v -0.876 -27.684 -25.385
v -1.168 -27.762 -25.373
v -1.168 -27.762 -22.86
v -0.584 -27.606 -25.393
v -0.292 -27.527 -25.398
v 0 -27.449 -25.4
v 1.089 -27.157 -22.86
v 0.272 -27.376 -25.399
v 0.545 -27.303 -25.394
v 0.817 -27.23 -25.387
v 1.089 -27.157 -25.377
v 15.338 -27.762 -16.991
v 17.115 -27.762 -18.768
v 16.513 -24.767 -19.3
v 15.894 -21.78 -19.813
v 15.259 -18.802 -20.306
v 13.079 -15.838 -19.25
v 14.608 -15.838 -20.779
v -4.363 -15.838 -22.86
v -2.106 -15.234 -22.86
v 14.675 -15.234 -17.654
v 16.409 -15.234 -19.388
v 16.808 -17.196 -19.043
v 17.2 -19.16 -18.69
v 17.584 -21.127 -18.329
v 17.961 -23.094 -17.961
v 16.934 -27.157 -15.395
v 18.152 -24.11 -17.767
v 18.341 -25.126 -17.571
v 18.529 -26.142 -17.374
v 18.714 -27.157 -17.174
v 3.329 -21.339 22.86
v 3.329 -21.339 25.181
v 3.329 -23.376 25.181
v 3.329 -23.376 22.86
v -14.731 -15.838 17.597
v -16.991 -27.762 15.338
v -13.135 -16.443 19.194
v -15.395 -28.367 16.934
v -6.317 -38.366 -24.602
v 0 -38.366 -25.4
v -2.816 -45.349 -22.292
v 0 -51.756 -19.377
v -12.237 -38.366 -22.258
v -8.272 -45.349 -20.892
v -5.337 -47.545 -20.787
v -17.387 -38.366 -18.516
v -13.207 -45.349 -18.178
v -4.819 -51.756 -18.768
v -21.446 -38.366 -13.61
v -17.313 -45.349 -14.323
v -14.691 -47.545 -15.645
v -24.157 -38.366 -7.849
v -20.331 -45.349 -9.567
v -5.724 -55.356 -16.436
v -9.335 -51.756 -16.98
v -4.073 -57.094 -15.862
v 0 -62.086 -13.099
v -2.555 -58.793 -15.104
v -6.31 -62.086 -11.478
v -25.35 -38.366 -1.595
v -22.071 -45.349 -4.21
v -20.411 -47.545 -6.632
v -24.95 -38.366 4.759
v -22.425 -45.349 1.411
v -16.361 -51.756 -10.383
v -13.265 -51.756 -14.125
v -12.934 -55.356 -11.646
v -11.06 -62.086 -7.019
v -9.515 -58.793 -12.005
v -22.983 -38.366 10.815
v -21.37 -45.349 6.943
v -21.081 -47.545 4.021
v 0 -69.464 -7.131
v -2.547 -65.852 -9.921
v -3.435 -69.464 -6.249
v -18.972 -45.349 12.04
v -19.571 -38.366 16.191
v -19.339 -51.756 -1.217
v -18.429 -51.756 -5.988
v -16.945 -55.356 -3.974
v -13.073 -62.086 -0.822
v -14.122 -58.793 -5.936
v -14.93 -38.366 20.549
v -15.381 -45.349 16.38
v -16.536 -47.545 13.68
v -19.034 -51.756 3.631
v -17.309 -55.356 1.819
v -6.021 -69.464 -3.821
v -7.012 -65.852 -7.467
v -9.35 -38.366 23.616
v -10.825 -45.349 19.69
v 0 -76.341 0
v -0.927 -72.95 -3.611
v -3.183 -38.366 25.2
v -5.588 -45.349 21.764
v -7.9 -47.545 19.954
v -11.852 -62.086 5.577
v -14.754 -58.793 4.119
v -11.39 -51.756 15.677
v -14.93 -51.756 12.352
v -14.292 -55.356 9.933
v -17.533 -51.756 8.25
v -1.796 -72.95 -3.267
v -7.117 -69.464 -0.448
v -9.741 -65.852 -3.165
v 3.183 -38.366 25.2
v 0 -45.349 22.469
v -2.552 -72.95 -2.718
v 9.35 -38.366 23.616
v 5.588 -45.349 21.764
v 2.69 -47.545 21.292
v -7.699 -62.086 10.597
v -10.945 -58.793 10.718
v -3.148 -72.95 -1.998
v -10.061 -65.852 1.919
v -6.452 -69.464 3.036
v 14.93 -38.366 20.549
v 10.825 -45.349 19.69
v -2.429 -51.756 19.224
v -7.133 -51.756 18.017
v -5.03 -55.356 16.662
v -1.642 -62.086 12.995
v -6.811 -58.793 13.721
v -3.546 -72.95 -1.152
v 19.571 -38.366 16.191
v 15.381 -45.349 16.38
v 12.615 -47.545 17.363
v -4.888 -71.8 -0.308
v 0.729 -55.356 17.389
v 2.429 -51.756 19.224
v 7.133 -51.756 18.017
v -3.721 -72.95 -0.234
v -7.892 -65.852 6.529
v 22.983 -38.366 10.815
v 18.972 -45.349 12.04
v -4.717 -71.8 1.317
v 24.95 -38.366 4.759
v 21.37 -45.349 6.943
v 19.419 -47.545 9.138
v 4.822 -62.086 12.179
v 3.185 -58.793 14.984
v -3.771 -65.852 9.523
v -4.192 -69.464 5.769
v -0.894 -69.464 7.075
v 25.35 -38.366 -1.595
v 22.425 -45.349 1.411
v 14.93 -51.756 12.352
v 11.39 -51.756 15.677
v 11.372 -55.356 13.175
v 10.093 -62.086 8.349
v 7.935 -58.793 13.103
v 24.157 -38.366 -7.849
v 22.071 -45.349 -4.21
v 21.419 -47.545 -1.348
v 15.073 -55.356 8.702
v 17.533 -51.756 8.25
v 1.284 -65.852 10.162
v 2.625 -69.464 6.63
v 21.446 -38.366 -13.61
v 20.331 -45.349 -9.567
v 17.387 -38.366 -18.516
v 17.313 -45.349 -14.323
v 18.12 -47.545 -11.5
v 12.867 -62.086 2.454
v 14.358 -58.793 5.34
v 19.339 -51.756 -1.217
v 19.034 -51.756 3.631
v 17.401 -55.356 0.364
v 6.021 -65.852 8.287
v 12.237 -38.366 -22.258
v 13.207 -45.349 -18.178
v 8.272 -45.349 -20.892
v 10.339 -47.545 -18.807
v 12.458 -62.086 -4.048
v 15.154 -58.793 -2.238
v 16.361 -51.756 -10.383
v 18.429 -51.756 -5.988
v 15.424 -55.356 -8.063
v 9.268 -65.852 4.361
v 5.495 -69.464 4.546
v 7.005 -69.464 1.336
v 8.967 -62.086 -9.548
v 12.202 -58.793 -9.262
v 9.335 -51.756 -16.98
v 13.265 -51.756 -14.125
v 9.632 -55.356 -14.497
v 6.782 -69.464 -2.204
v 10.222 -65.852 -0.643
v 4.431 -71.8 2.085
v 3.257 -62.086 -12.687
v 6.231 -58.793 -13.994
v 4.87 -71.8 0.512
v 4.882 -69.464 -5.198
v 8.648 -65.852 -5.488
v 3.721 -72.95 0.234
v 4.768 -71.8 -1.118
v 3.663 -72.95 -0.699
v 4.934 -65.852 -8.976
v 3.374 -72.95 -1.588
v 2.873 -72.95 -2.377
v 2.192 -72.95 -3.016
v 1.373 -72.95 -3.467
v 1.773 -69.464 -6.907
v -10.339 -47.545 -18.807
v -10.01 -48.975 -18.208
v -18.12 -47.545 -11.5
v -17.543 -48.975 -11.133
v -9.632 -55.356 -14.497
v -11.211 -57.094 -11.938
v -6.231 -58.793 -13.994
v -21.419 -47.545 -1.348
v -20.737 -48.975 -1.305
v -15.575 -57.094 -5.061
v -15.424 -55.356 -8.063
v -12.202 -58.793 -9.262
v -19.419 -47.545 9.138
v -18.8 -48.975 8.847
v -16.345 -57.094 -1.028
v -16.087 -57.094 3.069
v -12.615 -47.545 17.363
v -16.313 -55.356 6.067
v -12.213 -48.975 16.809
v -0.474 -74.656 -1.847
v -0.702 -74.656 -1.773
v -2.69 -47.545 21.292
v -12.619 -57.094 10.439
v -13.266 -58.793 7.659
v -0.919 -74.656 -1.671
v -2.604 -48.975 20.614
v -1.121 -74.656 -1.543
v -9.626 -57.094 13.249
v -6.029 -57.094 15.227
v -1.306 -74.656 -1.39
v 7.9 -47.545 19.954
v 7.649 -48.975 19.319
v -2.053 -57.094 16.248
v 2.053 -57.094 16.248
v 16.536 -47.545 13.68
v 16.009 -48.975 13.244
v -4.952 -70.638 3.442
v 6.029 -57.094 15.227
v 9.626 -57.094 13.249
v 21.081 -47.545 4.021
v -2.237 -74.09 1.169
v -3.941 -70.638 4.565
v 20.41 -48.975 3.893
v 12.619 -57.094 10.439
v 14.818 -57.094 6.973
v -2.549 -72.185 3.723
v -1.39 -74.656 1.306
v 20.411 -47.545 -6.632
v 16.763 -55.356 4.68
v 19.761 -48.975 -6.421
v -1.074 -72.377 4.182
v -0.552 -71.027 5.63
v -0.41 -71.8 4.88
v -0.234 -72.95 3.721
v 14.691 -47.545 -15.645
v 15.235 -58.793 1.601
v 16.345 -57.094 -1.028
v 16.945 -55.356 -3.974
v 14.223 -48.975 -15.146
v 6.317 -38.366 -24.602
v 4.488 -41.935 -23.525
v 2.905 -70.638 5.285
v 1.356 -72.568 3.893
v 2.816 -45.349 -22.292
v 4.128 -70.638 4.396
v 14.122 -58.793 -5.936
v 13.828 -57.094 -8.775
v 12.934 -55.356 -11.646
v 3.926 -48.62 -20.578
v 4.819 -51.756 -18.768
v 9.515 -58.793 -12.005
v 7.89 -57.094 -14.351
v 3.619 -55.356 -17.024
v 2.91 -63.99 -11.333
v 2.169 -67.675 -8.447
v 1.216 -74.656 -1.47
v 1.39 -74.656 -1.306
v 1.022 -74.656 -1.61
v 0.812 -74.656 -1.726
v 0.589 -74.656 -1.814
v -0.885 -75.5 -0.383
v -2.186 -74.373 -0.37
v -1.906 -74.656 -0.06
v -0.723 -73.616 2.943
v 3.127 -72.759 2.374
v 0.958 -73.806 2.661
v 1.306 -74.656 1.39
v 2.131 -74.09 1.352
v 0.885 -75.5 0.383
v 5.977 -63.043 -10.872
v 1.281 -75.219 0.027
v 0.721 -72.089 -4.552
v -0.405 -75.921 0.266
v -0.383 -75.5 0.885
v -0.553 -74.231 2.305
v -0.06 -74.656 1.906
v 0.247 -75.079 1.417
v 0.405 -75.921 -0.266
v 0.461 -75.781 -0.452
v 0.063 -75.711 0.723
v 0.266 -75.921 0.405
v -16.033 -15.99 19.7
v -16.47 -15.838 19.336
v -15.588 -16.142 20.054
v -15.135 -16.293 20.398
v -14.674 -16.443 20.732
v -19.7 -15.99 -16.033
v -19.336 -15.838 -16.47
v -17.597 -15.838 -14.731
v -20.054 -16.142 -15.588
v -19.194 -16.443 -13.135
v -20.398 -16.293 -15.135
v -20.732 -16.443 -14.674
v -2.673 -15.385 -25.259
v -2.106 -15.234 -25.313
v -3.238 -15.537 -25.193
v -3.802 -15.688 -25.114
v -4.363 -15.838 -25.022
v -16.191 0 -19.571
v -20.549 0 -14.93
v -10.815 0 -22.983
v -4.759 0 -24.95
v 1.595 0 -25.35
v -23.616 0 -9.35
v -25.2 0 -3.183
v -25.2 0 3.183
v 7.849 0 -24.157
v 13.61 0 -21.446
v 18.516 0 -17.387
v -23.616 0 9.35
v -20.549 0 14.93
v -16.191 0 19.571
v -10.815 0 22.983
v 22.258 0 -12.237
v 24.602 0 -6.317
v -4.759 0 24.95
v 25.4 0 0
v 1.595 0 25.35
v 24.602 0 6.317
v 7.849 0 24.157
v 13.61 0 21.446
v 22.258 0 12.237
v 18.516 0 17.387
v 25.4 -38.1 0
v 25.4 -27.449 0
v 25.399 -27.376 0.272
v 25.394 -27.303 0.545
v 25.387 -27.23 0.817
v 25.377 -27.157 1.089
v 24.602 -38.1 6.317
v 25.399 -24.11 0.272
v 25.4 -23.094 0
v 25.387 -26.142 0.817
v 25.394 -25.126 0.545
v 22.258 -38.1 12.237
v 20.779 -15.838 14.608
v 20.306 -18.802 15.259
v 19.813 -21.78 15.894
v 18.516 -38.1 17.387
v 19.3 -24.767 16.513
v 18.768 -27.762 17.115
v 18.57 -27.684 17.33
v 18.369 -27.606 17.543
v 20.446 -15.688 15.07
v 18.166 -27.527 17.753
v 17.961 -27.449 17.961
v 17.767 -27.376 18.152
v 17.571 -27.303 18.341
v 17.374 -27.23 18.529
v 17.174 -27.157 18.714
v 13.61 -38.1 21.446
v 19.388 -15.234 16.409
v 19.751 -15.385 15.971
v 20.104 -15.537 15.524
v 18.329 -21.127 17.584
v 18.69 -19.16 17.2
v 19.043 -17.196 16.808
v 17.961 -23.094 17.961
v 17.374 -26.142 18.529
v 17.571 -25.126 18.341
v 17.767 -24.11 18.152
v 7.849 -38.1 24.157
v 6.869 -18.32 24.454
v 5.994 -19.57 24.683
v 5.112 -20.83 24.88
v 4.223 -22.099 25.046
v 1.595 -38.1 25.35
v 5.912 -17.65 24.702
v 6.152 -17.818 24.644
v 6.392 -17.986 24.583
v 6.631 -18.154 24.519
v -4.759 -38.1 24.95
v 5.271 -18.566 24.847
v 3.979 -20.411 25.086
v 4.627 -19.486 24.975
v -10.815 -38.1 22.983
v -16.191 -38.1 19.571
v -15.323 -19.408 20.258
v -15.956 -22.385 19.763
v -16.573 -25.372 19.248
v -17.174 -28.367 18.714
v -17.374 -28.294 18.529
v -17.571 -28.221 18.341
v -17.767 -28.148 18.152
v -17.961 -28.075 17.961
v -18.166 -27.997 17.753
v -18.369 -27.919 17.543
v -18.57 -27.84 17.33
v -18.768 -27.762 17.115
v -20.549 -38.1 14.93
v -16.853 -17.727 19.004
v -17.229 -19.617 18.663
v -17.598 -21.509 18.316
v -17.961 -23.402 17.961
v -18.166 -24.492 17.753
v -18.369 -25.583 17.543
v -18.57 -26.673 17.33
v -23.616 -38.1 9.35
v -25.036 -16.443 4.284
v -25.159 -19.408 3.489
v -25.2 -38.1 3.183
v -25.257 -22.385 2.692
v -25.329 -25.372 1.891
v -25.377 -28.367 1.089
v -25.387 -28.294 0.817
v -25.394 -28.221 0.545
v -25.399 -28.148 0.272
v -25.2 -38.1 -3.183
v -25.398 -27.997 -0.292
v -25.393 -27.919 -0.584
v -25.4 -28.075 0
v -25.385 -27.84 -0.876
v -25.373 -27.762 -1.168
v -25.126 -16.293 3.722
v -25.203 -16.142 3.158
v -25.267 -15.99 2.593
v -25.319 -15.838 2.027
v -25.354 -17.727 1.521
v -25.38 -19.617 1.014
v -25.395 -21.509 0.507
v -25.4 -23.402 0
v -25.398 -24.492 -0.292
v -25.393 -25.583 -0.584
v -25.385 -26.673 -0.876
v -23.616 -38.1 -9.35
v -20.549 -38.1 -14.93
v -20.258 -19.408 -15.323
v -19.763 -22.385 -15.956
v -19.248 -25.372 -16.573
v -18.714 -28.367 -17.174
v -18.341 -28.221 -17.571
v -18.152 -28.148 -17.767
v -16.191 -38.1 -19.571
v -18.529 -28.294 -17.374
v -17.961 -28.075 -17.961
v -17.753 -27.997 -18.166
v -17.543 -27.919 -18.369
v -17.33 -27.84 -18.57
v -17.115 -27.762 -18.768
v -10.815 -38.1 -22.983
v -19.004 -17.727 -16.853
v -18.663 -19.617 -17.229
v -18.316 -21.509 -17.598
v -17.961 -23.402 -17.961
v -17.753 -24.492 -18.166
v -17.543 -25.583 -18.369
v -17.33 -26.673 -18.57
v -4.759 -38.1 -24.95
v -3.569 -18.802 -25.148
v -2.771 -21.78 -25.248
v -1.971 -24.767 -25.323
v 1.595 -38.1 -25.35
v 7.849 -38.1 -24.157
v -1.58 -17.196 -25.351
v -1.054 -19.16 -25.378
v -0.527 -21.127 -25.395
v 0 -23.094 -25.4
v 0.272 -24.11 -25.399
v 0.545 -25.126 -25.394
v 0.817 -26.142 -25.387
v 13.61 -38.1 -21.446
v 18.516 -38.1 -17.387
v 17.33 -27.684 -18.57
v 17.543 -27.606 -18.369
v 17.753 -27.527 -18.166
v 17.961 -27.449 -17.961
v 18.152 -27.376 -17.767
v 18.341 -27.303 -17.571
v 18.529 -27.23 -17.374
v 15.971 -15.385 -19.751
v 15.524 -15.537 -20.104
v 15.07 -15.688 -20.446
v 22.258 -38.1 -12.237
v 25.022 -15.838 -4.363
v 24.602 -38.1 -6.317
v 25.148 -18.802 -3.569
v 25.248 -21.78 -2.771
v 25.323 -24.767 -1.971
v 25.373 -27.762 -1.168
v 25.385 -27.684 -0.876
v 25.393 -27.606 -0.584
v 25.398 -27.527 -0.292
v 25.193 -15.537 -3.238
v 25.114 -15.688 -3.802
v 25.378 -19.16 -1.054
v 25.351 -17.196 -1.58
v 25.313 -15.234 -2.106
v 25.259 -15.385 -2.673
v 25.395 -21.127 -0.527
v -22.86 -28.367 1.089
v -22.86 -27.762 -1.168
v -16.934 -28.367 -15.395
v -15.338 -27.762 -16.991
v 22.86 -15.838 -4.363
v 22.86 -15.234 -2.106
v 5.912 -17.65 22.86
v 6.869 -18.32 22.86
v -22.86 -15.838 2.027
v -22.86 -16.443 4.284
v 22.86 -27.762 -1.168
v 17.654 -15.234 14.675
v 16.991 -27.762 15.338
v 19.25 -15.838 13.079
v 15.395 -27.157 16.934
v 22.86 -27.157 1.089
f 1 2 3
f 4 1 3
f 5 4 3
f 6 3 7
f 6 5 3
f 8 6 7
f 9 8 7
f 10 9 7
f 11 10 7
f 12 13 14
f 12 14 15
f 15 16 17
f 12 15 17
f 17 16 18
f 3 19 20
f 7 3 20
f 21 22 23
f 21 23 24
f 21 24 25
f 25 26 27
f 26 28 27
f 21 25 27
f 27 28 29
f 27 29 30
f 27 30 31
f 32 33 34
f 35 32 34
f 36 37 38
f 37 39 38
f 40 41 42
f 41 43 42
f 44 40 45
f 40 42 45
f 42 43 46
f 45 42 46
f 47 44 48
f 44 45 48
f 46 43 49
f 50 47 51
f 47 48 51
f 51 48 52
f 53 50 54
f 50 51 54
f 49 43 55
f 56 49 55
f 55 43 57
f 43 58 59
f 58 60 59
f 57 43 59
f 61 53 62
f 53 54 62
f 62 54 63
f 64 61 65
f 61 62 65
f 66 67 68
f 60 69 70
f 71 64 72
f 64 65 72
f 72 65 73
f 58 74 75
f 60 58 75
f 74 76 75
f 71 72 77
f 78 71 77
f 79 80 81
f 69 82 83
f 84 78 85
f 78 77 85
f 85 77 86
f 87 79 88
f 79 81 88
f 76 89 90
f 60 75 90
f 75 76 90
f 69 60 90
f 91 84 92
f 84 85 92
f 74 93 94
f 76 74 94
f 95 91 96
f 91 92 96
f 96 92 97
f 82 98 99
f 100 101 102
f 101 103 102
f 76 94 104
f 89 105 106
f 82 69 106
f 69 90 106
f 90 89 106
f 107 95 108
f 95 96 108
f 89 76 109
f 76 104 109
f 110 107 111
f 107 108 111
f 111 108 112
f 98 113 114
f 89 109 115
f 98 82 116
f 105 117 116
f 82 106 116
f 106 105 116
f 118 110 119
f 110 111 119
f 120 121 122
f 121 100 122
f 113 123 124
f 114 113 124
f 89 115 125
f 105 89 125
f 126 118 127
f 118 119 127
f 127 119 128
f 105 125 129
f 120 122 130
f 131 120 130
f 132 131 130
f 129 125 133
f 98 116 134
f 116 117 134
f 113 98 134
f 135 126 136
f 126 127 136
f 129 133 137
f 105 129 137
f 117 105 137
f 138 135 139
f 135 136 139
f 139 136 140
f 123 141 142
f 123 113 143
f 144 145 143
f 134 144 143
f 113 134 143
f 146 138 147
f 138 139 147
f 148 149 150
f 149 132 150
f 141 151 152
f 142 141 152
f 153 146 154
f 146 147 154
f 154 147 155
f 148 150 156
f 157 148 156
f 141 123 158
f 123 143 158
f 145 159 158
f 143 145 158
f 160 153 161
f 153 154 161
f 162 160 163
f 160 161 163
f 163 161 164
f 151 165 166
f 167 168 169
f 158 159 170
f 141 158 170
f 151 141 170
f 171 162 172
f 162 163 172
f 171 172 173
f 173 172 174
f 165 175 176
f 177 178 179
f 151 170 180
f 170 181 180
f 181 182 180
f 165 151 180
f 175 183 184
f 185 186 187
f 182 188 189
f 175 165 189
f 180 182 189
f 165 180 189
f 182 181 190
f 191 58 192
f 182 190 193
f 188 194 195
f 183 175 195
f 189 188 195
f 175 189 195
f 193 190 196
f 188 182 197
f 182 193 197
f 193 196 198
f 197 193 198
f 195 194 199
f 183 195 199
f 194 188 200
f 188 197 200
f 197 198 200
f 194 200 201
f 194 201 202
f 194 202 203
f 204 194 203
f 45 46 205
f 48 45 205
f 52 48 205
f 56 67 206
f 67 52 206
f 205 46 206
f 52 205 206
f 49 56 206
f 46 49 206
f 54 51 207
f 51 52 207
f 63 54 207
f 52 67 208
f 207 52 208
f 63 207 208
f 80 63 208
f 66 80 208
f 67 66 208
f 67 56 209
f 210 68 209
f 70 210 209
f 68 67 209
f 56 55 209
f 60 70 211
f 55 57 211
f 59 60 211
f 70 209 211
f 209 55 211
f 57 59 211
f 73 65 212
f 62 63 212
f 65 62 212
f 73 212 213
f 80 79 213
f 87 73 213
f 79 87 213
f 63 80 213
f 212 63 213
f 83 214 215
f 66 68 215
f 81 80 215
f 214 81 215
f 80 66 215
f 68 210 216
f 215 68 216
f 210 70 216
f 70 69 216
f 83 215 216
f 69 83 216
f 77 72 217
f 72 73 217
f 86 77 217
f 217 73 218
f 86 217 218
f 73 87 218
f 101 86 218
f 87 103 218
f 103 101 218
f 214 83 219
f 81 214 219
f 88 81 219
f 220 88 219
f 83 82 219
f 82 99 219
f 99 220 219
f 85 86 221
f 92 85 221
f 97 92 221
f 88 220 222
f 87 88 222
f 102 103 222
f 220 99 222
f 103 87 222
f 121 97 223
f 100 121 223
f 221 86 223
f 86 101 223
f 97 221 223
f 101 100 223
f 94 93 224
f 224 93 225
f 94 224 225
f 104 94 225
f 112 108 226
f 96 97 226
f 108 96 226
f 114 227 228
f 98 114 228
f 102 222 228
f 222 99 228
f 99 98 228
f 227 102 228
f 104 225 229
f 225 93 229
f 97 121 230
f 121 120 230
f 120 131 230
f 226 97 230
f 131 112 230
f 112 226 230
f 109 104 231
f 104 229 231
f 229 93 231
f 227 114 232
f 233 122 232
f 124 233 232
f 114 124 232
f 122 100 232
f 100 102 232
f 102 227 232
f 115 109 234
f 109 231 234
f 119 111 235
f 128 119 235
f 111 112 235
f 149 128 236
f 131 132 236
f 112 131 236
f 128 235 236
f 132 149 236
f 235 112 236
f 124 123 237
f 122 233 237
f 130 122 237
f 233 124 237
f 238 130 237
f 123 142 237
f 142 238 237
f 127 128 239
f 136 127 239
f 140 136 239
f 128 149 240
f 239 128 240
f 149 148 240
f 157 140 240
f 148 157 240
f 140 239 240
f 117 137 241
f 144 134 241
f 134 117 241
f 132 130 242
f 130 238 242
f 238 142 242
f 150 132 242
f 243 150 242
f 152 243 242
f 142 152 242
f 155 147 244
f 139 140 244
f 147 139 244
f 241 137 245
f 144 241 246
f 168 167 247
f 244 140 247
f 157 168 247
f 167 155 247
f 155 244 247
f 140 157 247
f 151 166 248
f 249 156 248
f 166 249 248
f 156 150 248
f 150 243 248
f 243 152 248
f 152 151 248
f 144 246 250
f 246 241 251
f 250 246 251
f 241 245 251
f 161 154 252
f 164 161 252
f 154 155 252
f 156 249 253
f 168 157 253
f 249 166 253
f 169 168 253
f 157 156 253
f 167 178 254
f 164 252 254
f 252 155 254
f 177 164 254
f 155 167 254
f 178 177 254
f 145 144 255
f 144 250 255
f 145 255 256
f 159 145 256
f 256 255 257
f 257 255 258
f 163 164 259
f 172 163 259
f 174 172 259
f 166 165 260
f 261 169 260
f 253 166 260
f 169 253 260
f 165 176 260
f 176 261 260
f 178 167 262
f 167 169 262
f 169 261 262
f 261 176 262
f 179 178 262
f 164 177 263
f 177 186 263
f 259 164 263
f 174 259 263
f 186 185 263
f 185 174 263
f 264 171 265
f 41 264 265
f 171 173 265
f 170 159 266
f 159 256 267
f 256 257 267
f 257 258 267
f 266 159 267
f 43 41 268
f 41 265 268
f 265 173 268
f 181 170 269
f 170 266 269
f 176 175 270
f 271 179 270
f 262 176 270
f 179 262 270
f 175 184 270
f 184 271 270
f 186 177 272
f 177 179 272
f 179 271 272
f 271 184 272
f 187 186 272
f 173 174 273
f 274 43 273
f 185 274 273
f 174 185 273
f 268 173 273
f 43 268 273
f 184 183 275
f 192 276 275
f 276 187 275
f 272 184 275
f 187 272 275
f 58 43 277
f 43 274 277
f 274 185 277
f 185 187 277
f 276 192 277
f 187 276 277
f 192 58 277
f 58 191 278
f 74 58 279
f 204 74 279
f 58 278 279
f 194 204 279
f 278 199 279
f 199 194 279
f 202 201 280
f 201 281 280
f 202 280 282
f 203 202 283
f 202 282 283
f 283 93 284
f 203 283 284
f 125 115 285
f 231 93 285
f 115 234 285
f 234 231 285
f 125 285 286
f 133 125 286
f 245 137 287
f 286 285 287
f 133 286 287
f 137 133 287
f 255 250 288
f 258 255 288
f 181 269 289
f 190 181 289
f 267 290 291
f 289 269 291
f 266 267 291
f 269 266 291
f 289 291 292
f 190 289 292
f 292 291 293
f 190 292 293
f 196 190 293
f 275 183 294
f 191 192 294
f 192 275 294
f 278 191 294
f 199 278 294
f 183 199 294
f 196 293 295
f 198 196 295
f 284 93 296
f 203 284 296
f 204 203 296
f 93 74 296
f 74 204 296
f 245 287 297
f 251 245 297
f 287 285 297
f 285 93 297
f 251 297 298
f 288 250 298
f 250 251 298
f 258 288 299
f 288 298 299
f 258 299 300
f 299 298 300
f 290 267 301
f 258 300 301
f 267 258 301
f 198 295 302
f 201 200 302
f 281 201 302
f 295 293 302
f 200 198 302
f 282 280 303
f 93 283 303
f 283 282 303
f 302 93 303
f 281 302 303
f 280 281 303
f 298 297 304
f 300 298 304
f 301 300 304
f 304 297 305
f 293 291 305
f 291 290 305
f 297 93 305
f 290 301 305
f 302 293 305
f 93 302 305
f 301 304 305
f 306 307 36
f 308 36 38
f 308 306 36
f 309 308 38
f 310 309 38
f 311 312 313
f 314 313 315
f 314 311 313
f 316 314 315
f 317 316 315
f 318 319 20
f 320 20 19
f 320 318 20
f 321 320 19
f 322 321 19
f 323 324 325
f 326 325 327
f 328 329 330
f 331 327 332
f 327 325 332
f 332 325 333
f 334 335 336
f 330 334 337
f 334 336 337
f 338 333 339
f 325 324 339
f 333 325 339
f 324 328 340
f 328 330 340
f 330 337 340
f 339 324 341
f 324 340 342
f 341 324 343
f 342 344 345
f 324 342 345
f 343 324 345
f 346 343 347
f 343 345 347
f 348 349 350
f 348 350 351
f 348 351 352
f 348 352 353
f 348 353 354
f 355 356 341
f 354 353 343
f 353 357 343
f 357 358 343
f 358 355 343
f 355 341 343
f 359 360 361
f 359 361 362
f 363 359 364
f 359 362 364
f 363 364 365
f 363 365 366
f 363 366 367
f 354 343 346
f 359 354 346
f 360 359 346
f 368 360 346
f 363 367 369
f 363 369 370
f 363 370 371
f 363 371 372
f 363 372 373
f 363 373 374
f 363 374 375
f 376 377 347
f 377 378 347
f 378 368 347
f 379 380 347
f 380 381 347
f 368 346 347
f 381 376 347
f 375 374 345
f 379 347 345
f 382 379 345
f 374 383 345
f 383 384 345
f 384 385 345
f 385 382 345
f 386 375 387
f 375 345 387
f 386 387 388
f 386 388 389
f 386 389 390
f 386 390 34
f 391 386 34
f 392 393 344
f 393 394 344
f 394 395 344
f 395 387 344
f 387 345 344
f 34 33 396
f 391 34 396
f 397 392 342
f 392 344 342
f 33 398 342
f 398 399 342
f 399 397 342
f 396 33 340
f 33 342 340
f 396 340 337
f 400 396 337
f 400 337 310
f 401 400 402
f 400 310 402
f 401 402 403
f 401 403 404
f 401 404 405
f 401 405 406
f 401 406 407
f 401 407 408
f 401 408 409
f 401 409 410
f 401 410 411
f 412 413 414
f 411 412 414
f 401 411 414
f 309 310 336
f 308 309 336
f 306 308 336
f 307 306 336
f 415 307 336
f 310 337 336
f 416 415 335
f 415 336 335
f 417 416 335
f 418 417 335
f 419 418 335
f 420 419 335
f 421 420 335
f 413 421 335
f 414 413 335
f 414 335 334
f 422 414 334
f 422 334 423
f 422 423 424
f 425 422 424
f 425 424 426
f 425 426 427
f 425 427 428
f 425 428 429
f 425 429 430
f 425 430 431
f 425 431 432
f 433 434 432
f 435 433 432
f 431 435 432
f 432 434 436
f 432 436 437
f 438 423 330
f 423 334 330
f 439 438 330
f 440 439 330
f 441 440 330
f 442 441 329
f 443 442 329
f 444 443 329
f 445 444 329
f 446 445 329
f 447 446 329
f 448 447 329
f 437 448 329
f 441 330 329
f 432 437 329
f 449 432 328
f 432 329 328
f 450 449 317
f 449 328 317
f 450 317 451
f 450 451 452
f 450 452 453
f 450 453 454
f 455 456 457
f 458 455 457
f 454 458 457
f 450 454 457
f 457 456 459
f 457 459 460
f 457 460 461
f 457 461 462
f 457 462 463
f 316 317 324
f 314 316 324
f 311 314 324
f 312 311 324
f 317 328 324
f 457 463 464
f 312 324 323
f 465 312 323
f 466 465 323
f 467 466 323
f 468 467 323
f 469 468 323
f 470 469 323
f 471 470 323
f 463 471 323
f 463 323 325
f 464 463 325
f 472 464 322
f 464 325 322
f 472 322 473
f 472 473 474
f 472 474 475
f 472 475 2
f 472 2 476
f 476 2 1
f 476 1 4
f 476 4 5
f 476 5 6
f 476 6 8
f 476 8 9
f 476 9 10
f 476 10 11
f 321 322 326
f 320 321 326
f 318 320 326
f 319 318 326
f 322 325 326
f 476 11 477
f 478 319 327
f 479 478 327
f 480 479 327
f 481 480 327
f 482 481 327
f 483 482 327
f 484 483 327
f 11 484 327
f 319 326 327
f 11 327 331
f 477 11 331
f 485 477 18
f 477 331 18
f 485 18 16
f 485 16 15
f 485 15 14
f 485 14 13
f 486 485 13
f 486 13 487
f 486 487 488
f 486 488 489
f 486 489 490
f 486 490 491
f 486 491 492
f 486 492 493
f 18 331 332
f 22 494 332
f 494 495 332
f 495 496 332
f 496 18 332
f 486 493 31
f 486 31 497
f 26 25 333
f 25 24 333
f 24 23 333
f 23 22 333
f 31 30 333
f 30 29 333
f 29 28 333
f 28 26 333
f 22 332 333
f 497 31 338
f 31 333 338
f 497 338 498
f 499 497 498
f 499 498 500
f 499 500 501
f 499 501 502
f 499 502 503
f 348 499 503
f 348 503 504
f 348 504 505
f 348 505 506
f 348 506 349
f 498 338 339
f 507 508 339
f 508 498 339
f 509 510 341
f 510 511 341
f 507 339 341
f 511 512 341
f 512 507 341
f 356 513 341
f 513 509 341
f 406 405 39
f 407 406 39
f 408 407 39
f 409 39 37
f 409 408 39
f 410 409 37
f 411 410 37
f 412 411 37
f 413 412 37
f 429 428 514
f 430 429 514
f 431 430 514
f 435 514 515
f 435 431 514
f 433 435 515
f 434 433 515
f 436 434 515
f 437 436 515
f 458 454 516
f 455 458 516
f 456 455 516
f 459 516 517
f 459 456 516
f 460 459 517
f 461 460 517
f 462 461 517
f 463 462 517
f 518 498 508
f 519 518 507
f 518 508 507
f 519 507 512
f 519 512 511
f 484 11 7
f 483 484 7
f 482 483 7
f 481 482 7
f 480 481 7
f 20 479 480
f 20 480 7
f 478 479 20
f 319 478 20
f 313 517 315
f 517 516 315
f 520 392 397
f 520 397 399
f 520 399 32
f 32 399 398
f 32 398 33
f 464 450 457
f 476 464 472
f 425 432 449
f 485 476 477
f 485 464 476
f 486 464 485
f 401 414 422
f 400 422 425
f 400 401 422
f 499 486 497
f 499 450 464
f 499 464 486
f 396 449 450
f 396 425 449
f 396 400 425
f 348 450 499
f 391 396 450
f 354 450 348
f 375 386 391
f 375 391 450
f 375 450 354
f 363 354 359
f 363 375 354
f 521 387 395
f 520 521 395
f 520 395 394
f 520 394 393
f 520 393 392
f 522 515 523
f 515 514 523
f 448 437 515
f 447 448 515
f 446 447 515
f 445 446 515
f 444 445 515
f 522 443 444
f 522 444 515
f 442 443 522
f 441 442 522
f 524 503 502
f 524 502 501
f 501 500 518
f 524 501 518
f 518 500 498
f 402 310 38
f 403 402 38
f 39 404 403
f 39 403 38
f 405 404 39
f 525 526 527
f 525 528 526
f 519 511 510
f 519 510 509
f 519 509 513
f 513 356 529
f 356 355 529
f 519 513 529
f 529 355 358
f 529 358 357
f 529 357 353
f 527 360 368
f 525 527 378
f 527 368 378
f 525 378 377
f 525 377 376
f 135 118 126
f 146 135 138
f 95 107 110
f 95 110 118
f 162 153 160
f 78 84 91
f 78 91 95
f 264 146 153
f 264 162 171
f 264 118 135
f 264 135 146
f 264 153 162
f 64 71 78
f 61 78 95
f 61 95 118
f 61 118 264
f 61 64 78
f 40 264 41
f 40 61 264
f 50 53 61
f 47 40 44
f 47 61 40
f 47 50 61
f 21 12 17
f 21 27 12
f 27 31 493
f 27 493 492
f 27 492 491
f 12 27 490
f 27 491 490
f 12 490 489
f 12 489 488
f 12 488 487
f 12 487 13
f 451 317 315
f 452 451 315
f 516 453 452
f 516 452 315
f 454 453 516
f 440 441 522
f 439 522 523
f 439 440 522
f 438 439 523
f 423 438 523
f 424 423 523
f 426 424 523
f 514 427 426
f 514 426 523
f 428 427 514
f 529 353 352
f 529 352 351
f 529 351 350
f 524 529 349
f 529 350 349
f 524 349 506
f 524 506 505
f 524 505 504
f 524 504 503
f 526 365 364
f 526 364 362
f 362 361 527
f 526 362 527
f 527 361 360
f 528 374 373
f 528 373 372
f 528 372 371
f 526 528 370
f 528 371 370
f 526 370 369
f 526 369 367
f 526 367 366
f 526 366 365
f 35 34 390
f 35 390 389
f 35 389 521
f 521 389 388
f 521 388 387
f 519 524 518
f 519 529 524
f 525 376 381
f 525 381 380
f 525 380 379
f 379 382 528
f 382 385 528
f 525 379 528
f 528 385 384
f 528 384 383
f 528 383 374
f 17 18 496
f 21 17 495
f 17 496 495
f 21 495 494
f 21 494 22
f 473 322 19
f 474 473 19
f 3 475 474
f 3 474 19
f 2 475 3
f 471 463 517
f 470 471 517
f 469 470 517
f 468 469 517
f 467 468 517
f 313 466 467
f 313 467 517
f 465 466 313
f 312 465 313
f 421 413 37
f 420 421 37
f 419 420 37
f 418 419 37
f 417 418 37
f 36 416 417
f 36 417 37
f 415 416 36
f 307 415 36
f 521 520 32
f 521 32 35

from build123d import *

# Parameters (mm, degrees)
F0_R      = 25.4
F1_DEPTH  = 38.1
F22_DEPTH = 2.54
F23_DEPTH = 2.54
F24_DEPTH = 2.54
F25_DEPTH = 2.54
F26_DEPTH = 2.54
F27_DEPTH = 2.54
F28_DEPTH = 2.54
F29_DEPTH = 2.54


with BuildPart() as f1:
    # F0 (on Front) → F1 (new body)
    with BuildSketch(Plane.XZ):
        Circle(F0_R)
    extrude(amount=F1_DEPTH)

    # F16 (on offset) → F22 (cut)
    with BuildSketch(Plane.YZ.offset(-25.4)):
        Polygon((-27.7622, -1.1684), (-15.83842523, 2.0265658204), (-16.4432335746, 4.2837412912), (-28.3670083446, 1.0887754709), align=None)
    extrude(amount=F22_DEPTH, mode=Mode.SUBTRACT)

    # F15 (on face) → F23 (cut)
    with BuildSketch(Plane(origin=(-17.9605122421, 0, 17.9605122421), x_dir=(0, 1, 0), z_dir=(0.7071067812, 0, -0.7071067812))):
        Polygon((-27.7622, -1.1684), (-15.83842523, 2.0265658204), (-16.4432335746, 4.2837412912), (-28.3670083446, 1.0887754709), align=None)
    extrude(amount=F23_DEPTH, mode=Mode.SUBTRACT)

    # F21 (on offset) → F24 (cut)
    with BuildSketch(Plane.XY.offset(25.4)):
        Polygon((5.9120569609, -17.6502595045), (3.328925729, -21.3393532245), (3.328925729, -23.3763964605), (6.8691542094, -18.3204262127), align=None)
    extrude(amount=-F24_DEPTH, mode=Mode.SUBTRACT)

    # F14 (on face) → F25 (cut)
    with BuildSketch(Plane(origin=(17.9605122421, 0, 17.9605122421), x_dir=(0, 1, 0), z_dir=(0.7071067812, 0, 0.7071067812))):
        Polygon((-27.7622, -1.1684), (-15.83842523, -4.3633658204), (-15.2336168854, -2.1061903495), (-27.1573916554, 1.0887754709), align=None)
    extrude(amount=-F25_DEPTH, mode=Mode.SUBTRACT)

    # F20 (on offset) → F26 (cut)
    with BuildSketch(Plane.YZ.offset(25.4)):
        Polygon((-27.7622, -1.1684), (-15.83842523, -4.3633658204), (-15.2336168854, -2.1061903495), (-27.1573916554, 1.0887754709), align=None)
    extrude(amount=-F26_DEPTH, mode=Mode.SUBTRACT)

    # F19 (on face) → F27 (cut)
    with BuildSketch(Plane(origin=(17.9605122421, 0, -17.9605122421), x_dir=(0, 1, 0), z_dir=(0.7071067812, 0, -0.7071067812))):
        Polygon((-27.7622, -1.1684), (-15.83842523, -4.3633658204), (-15.2336168854, -2.1061903495), (-27.1573916554, 1.0887754709), align=None)
    extrude(amount=-F27_DEPTH, mode=Mode.SUBTRACT)

    # F18 (on offset) → F28 (cut)
    with BuildSketch(Plane.XY.offset(-25.4)):
        Polygon((-4.3633658204, -15.83842523), (-1.1684, -27.7622), (1.0887754709, -27.1573916554), (-2.1061903495, -15.2336168854), align=None)
    extrude(amount=F28_DEPTH, mode=Mode.SUBTRACT)

    # F17 (on face) → F29 (cut)
    with BuildSketch(Plane(origin=(-17.9605122421, 0, -17.9605122421), x_dir=(0, 1, 0), z_dir=(0.7071067812, 0, 0.7071067812))):
        Polygon((-27.7622, -1.1684), (-15.83842523, 2.0265658204), (-16.4432335746, 4.2837412912), (-28.3670083446, 1.0887754709), align=None)
    extrude(amount=F29_DEPTH, mode=Mode.SUBTRACT)


with BuildPart() as f3:
    # F2 (on Right) → F3 (revolve)
    with BuildSketch(Plane.YZ):
        with BuildLine():
            Line((-38.3663102984, 0), (-76.3406405559, 0))
            add(Edge.make_bspline(
                [(-38.3663102984, -25.4), (-54.5826740563, -18.9965814352), (-65.9471228719, -12.1034290642), (-76.3406405559, 0)],
                knots=[0, 0, 0, 0, 45.6859908342, 45.6859908342, 45.6859908342, 45.6859908342], degree=3))
            Line((-38.3663102984, -25.4), (-38.3663102984, 0))
        make_face()
    revolve(axis=Axis((0, -57.3534754272, 0), (0, 1, 0)))


solid = Compound([f1.part, f3.part])
